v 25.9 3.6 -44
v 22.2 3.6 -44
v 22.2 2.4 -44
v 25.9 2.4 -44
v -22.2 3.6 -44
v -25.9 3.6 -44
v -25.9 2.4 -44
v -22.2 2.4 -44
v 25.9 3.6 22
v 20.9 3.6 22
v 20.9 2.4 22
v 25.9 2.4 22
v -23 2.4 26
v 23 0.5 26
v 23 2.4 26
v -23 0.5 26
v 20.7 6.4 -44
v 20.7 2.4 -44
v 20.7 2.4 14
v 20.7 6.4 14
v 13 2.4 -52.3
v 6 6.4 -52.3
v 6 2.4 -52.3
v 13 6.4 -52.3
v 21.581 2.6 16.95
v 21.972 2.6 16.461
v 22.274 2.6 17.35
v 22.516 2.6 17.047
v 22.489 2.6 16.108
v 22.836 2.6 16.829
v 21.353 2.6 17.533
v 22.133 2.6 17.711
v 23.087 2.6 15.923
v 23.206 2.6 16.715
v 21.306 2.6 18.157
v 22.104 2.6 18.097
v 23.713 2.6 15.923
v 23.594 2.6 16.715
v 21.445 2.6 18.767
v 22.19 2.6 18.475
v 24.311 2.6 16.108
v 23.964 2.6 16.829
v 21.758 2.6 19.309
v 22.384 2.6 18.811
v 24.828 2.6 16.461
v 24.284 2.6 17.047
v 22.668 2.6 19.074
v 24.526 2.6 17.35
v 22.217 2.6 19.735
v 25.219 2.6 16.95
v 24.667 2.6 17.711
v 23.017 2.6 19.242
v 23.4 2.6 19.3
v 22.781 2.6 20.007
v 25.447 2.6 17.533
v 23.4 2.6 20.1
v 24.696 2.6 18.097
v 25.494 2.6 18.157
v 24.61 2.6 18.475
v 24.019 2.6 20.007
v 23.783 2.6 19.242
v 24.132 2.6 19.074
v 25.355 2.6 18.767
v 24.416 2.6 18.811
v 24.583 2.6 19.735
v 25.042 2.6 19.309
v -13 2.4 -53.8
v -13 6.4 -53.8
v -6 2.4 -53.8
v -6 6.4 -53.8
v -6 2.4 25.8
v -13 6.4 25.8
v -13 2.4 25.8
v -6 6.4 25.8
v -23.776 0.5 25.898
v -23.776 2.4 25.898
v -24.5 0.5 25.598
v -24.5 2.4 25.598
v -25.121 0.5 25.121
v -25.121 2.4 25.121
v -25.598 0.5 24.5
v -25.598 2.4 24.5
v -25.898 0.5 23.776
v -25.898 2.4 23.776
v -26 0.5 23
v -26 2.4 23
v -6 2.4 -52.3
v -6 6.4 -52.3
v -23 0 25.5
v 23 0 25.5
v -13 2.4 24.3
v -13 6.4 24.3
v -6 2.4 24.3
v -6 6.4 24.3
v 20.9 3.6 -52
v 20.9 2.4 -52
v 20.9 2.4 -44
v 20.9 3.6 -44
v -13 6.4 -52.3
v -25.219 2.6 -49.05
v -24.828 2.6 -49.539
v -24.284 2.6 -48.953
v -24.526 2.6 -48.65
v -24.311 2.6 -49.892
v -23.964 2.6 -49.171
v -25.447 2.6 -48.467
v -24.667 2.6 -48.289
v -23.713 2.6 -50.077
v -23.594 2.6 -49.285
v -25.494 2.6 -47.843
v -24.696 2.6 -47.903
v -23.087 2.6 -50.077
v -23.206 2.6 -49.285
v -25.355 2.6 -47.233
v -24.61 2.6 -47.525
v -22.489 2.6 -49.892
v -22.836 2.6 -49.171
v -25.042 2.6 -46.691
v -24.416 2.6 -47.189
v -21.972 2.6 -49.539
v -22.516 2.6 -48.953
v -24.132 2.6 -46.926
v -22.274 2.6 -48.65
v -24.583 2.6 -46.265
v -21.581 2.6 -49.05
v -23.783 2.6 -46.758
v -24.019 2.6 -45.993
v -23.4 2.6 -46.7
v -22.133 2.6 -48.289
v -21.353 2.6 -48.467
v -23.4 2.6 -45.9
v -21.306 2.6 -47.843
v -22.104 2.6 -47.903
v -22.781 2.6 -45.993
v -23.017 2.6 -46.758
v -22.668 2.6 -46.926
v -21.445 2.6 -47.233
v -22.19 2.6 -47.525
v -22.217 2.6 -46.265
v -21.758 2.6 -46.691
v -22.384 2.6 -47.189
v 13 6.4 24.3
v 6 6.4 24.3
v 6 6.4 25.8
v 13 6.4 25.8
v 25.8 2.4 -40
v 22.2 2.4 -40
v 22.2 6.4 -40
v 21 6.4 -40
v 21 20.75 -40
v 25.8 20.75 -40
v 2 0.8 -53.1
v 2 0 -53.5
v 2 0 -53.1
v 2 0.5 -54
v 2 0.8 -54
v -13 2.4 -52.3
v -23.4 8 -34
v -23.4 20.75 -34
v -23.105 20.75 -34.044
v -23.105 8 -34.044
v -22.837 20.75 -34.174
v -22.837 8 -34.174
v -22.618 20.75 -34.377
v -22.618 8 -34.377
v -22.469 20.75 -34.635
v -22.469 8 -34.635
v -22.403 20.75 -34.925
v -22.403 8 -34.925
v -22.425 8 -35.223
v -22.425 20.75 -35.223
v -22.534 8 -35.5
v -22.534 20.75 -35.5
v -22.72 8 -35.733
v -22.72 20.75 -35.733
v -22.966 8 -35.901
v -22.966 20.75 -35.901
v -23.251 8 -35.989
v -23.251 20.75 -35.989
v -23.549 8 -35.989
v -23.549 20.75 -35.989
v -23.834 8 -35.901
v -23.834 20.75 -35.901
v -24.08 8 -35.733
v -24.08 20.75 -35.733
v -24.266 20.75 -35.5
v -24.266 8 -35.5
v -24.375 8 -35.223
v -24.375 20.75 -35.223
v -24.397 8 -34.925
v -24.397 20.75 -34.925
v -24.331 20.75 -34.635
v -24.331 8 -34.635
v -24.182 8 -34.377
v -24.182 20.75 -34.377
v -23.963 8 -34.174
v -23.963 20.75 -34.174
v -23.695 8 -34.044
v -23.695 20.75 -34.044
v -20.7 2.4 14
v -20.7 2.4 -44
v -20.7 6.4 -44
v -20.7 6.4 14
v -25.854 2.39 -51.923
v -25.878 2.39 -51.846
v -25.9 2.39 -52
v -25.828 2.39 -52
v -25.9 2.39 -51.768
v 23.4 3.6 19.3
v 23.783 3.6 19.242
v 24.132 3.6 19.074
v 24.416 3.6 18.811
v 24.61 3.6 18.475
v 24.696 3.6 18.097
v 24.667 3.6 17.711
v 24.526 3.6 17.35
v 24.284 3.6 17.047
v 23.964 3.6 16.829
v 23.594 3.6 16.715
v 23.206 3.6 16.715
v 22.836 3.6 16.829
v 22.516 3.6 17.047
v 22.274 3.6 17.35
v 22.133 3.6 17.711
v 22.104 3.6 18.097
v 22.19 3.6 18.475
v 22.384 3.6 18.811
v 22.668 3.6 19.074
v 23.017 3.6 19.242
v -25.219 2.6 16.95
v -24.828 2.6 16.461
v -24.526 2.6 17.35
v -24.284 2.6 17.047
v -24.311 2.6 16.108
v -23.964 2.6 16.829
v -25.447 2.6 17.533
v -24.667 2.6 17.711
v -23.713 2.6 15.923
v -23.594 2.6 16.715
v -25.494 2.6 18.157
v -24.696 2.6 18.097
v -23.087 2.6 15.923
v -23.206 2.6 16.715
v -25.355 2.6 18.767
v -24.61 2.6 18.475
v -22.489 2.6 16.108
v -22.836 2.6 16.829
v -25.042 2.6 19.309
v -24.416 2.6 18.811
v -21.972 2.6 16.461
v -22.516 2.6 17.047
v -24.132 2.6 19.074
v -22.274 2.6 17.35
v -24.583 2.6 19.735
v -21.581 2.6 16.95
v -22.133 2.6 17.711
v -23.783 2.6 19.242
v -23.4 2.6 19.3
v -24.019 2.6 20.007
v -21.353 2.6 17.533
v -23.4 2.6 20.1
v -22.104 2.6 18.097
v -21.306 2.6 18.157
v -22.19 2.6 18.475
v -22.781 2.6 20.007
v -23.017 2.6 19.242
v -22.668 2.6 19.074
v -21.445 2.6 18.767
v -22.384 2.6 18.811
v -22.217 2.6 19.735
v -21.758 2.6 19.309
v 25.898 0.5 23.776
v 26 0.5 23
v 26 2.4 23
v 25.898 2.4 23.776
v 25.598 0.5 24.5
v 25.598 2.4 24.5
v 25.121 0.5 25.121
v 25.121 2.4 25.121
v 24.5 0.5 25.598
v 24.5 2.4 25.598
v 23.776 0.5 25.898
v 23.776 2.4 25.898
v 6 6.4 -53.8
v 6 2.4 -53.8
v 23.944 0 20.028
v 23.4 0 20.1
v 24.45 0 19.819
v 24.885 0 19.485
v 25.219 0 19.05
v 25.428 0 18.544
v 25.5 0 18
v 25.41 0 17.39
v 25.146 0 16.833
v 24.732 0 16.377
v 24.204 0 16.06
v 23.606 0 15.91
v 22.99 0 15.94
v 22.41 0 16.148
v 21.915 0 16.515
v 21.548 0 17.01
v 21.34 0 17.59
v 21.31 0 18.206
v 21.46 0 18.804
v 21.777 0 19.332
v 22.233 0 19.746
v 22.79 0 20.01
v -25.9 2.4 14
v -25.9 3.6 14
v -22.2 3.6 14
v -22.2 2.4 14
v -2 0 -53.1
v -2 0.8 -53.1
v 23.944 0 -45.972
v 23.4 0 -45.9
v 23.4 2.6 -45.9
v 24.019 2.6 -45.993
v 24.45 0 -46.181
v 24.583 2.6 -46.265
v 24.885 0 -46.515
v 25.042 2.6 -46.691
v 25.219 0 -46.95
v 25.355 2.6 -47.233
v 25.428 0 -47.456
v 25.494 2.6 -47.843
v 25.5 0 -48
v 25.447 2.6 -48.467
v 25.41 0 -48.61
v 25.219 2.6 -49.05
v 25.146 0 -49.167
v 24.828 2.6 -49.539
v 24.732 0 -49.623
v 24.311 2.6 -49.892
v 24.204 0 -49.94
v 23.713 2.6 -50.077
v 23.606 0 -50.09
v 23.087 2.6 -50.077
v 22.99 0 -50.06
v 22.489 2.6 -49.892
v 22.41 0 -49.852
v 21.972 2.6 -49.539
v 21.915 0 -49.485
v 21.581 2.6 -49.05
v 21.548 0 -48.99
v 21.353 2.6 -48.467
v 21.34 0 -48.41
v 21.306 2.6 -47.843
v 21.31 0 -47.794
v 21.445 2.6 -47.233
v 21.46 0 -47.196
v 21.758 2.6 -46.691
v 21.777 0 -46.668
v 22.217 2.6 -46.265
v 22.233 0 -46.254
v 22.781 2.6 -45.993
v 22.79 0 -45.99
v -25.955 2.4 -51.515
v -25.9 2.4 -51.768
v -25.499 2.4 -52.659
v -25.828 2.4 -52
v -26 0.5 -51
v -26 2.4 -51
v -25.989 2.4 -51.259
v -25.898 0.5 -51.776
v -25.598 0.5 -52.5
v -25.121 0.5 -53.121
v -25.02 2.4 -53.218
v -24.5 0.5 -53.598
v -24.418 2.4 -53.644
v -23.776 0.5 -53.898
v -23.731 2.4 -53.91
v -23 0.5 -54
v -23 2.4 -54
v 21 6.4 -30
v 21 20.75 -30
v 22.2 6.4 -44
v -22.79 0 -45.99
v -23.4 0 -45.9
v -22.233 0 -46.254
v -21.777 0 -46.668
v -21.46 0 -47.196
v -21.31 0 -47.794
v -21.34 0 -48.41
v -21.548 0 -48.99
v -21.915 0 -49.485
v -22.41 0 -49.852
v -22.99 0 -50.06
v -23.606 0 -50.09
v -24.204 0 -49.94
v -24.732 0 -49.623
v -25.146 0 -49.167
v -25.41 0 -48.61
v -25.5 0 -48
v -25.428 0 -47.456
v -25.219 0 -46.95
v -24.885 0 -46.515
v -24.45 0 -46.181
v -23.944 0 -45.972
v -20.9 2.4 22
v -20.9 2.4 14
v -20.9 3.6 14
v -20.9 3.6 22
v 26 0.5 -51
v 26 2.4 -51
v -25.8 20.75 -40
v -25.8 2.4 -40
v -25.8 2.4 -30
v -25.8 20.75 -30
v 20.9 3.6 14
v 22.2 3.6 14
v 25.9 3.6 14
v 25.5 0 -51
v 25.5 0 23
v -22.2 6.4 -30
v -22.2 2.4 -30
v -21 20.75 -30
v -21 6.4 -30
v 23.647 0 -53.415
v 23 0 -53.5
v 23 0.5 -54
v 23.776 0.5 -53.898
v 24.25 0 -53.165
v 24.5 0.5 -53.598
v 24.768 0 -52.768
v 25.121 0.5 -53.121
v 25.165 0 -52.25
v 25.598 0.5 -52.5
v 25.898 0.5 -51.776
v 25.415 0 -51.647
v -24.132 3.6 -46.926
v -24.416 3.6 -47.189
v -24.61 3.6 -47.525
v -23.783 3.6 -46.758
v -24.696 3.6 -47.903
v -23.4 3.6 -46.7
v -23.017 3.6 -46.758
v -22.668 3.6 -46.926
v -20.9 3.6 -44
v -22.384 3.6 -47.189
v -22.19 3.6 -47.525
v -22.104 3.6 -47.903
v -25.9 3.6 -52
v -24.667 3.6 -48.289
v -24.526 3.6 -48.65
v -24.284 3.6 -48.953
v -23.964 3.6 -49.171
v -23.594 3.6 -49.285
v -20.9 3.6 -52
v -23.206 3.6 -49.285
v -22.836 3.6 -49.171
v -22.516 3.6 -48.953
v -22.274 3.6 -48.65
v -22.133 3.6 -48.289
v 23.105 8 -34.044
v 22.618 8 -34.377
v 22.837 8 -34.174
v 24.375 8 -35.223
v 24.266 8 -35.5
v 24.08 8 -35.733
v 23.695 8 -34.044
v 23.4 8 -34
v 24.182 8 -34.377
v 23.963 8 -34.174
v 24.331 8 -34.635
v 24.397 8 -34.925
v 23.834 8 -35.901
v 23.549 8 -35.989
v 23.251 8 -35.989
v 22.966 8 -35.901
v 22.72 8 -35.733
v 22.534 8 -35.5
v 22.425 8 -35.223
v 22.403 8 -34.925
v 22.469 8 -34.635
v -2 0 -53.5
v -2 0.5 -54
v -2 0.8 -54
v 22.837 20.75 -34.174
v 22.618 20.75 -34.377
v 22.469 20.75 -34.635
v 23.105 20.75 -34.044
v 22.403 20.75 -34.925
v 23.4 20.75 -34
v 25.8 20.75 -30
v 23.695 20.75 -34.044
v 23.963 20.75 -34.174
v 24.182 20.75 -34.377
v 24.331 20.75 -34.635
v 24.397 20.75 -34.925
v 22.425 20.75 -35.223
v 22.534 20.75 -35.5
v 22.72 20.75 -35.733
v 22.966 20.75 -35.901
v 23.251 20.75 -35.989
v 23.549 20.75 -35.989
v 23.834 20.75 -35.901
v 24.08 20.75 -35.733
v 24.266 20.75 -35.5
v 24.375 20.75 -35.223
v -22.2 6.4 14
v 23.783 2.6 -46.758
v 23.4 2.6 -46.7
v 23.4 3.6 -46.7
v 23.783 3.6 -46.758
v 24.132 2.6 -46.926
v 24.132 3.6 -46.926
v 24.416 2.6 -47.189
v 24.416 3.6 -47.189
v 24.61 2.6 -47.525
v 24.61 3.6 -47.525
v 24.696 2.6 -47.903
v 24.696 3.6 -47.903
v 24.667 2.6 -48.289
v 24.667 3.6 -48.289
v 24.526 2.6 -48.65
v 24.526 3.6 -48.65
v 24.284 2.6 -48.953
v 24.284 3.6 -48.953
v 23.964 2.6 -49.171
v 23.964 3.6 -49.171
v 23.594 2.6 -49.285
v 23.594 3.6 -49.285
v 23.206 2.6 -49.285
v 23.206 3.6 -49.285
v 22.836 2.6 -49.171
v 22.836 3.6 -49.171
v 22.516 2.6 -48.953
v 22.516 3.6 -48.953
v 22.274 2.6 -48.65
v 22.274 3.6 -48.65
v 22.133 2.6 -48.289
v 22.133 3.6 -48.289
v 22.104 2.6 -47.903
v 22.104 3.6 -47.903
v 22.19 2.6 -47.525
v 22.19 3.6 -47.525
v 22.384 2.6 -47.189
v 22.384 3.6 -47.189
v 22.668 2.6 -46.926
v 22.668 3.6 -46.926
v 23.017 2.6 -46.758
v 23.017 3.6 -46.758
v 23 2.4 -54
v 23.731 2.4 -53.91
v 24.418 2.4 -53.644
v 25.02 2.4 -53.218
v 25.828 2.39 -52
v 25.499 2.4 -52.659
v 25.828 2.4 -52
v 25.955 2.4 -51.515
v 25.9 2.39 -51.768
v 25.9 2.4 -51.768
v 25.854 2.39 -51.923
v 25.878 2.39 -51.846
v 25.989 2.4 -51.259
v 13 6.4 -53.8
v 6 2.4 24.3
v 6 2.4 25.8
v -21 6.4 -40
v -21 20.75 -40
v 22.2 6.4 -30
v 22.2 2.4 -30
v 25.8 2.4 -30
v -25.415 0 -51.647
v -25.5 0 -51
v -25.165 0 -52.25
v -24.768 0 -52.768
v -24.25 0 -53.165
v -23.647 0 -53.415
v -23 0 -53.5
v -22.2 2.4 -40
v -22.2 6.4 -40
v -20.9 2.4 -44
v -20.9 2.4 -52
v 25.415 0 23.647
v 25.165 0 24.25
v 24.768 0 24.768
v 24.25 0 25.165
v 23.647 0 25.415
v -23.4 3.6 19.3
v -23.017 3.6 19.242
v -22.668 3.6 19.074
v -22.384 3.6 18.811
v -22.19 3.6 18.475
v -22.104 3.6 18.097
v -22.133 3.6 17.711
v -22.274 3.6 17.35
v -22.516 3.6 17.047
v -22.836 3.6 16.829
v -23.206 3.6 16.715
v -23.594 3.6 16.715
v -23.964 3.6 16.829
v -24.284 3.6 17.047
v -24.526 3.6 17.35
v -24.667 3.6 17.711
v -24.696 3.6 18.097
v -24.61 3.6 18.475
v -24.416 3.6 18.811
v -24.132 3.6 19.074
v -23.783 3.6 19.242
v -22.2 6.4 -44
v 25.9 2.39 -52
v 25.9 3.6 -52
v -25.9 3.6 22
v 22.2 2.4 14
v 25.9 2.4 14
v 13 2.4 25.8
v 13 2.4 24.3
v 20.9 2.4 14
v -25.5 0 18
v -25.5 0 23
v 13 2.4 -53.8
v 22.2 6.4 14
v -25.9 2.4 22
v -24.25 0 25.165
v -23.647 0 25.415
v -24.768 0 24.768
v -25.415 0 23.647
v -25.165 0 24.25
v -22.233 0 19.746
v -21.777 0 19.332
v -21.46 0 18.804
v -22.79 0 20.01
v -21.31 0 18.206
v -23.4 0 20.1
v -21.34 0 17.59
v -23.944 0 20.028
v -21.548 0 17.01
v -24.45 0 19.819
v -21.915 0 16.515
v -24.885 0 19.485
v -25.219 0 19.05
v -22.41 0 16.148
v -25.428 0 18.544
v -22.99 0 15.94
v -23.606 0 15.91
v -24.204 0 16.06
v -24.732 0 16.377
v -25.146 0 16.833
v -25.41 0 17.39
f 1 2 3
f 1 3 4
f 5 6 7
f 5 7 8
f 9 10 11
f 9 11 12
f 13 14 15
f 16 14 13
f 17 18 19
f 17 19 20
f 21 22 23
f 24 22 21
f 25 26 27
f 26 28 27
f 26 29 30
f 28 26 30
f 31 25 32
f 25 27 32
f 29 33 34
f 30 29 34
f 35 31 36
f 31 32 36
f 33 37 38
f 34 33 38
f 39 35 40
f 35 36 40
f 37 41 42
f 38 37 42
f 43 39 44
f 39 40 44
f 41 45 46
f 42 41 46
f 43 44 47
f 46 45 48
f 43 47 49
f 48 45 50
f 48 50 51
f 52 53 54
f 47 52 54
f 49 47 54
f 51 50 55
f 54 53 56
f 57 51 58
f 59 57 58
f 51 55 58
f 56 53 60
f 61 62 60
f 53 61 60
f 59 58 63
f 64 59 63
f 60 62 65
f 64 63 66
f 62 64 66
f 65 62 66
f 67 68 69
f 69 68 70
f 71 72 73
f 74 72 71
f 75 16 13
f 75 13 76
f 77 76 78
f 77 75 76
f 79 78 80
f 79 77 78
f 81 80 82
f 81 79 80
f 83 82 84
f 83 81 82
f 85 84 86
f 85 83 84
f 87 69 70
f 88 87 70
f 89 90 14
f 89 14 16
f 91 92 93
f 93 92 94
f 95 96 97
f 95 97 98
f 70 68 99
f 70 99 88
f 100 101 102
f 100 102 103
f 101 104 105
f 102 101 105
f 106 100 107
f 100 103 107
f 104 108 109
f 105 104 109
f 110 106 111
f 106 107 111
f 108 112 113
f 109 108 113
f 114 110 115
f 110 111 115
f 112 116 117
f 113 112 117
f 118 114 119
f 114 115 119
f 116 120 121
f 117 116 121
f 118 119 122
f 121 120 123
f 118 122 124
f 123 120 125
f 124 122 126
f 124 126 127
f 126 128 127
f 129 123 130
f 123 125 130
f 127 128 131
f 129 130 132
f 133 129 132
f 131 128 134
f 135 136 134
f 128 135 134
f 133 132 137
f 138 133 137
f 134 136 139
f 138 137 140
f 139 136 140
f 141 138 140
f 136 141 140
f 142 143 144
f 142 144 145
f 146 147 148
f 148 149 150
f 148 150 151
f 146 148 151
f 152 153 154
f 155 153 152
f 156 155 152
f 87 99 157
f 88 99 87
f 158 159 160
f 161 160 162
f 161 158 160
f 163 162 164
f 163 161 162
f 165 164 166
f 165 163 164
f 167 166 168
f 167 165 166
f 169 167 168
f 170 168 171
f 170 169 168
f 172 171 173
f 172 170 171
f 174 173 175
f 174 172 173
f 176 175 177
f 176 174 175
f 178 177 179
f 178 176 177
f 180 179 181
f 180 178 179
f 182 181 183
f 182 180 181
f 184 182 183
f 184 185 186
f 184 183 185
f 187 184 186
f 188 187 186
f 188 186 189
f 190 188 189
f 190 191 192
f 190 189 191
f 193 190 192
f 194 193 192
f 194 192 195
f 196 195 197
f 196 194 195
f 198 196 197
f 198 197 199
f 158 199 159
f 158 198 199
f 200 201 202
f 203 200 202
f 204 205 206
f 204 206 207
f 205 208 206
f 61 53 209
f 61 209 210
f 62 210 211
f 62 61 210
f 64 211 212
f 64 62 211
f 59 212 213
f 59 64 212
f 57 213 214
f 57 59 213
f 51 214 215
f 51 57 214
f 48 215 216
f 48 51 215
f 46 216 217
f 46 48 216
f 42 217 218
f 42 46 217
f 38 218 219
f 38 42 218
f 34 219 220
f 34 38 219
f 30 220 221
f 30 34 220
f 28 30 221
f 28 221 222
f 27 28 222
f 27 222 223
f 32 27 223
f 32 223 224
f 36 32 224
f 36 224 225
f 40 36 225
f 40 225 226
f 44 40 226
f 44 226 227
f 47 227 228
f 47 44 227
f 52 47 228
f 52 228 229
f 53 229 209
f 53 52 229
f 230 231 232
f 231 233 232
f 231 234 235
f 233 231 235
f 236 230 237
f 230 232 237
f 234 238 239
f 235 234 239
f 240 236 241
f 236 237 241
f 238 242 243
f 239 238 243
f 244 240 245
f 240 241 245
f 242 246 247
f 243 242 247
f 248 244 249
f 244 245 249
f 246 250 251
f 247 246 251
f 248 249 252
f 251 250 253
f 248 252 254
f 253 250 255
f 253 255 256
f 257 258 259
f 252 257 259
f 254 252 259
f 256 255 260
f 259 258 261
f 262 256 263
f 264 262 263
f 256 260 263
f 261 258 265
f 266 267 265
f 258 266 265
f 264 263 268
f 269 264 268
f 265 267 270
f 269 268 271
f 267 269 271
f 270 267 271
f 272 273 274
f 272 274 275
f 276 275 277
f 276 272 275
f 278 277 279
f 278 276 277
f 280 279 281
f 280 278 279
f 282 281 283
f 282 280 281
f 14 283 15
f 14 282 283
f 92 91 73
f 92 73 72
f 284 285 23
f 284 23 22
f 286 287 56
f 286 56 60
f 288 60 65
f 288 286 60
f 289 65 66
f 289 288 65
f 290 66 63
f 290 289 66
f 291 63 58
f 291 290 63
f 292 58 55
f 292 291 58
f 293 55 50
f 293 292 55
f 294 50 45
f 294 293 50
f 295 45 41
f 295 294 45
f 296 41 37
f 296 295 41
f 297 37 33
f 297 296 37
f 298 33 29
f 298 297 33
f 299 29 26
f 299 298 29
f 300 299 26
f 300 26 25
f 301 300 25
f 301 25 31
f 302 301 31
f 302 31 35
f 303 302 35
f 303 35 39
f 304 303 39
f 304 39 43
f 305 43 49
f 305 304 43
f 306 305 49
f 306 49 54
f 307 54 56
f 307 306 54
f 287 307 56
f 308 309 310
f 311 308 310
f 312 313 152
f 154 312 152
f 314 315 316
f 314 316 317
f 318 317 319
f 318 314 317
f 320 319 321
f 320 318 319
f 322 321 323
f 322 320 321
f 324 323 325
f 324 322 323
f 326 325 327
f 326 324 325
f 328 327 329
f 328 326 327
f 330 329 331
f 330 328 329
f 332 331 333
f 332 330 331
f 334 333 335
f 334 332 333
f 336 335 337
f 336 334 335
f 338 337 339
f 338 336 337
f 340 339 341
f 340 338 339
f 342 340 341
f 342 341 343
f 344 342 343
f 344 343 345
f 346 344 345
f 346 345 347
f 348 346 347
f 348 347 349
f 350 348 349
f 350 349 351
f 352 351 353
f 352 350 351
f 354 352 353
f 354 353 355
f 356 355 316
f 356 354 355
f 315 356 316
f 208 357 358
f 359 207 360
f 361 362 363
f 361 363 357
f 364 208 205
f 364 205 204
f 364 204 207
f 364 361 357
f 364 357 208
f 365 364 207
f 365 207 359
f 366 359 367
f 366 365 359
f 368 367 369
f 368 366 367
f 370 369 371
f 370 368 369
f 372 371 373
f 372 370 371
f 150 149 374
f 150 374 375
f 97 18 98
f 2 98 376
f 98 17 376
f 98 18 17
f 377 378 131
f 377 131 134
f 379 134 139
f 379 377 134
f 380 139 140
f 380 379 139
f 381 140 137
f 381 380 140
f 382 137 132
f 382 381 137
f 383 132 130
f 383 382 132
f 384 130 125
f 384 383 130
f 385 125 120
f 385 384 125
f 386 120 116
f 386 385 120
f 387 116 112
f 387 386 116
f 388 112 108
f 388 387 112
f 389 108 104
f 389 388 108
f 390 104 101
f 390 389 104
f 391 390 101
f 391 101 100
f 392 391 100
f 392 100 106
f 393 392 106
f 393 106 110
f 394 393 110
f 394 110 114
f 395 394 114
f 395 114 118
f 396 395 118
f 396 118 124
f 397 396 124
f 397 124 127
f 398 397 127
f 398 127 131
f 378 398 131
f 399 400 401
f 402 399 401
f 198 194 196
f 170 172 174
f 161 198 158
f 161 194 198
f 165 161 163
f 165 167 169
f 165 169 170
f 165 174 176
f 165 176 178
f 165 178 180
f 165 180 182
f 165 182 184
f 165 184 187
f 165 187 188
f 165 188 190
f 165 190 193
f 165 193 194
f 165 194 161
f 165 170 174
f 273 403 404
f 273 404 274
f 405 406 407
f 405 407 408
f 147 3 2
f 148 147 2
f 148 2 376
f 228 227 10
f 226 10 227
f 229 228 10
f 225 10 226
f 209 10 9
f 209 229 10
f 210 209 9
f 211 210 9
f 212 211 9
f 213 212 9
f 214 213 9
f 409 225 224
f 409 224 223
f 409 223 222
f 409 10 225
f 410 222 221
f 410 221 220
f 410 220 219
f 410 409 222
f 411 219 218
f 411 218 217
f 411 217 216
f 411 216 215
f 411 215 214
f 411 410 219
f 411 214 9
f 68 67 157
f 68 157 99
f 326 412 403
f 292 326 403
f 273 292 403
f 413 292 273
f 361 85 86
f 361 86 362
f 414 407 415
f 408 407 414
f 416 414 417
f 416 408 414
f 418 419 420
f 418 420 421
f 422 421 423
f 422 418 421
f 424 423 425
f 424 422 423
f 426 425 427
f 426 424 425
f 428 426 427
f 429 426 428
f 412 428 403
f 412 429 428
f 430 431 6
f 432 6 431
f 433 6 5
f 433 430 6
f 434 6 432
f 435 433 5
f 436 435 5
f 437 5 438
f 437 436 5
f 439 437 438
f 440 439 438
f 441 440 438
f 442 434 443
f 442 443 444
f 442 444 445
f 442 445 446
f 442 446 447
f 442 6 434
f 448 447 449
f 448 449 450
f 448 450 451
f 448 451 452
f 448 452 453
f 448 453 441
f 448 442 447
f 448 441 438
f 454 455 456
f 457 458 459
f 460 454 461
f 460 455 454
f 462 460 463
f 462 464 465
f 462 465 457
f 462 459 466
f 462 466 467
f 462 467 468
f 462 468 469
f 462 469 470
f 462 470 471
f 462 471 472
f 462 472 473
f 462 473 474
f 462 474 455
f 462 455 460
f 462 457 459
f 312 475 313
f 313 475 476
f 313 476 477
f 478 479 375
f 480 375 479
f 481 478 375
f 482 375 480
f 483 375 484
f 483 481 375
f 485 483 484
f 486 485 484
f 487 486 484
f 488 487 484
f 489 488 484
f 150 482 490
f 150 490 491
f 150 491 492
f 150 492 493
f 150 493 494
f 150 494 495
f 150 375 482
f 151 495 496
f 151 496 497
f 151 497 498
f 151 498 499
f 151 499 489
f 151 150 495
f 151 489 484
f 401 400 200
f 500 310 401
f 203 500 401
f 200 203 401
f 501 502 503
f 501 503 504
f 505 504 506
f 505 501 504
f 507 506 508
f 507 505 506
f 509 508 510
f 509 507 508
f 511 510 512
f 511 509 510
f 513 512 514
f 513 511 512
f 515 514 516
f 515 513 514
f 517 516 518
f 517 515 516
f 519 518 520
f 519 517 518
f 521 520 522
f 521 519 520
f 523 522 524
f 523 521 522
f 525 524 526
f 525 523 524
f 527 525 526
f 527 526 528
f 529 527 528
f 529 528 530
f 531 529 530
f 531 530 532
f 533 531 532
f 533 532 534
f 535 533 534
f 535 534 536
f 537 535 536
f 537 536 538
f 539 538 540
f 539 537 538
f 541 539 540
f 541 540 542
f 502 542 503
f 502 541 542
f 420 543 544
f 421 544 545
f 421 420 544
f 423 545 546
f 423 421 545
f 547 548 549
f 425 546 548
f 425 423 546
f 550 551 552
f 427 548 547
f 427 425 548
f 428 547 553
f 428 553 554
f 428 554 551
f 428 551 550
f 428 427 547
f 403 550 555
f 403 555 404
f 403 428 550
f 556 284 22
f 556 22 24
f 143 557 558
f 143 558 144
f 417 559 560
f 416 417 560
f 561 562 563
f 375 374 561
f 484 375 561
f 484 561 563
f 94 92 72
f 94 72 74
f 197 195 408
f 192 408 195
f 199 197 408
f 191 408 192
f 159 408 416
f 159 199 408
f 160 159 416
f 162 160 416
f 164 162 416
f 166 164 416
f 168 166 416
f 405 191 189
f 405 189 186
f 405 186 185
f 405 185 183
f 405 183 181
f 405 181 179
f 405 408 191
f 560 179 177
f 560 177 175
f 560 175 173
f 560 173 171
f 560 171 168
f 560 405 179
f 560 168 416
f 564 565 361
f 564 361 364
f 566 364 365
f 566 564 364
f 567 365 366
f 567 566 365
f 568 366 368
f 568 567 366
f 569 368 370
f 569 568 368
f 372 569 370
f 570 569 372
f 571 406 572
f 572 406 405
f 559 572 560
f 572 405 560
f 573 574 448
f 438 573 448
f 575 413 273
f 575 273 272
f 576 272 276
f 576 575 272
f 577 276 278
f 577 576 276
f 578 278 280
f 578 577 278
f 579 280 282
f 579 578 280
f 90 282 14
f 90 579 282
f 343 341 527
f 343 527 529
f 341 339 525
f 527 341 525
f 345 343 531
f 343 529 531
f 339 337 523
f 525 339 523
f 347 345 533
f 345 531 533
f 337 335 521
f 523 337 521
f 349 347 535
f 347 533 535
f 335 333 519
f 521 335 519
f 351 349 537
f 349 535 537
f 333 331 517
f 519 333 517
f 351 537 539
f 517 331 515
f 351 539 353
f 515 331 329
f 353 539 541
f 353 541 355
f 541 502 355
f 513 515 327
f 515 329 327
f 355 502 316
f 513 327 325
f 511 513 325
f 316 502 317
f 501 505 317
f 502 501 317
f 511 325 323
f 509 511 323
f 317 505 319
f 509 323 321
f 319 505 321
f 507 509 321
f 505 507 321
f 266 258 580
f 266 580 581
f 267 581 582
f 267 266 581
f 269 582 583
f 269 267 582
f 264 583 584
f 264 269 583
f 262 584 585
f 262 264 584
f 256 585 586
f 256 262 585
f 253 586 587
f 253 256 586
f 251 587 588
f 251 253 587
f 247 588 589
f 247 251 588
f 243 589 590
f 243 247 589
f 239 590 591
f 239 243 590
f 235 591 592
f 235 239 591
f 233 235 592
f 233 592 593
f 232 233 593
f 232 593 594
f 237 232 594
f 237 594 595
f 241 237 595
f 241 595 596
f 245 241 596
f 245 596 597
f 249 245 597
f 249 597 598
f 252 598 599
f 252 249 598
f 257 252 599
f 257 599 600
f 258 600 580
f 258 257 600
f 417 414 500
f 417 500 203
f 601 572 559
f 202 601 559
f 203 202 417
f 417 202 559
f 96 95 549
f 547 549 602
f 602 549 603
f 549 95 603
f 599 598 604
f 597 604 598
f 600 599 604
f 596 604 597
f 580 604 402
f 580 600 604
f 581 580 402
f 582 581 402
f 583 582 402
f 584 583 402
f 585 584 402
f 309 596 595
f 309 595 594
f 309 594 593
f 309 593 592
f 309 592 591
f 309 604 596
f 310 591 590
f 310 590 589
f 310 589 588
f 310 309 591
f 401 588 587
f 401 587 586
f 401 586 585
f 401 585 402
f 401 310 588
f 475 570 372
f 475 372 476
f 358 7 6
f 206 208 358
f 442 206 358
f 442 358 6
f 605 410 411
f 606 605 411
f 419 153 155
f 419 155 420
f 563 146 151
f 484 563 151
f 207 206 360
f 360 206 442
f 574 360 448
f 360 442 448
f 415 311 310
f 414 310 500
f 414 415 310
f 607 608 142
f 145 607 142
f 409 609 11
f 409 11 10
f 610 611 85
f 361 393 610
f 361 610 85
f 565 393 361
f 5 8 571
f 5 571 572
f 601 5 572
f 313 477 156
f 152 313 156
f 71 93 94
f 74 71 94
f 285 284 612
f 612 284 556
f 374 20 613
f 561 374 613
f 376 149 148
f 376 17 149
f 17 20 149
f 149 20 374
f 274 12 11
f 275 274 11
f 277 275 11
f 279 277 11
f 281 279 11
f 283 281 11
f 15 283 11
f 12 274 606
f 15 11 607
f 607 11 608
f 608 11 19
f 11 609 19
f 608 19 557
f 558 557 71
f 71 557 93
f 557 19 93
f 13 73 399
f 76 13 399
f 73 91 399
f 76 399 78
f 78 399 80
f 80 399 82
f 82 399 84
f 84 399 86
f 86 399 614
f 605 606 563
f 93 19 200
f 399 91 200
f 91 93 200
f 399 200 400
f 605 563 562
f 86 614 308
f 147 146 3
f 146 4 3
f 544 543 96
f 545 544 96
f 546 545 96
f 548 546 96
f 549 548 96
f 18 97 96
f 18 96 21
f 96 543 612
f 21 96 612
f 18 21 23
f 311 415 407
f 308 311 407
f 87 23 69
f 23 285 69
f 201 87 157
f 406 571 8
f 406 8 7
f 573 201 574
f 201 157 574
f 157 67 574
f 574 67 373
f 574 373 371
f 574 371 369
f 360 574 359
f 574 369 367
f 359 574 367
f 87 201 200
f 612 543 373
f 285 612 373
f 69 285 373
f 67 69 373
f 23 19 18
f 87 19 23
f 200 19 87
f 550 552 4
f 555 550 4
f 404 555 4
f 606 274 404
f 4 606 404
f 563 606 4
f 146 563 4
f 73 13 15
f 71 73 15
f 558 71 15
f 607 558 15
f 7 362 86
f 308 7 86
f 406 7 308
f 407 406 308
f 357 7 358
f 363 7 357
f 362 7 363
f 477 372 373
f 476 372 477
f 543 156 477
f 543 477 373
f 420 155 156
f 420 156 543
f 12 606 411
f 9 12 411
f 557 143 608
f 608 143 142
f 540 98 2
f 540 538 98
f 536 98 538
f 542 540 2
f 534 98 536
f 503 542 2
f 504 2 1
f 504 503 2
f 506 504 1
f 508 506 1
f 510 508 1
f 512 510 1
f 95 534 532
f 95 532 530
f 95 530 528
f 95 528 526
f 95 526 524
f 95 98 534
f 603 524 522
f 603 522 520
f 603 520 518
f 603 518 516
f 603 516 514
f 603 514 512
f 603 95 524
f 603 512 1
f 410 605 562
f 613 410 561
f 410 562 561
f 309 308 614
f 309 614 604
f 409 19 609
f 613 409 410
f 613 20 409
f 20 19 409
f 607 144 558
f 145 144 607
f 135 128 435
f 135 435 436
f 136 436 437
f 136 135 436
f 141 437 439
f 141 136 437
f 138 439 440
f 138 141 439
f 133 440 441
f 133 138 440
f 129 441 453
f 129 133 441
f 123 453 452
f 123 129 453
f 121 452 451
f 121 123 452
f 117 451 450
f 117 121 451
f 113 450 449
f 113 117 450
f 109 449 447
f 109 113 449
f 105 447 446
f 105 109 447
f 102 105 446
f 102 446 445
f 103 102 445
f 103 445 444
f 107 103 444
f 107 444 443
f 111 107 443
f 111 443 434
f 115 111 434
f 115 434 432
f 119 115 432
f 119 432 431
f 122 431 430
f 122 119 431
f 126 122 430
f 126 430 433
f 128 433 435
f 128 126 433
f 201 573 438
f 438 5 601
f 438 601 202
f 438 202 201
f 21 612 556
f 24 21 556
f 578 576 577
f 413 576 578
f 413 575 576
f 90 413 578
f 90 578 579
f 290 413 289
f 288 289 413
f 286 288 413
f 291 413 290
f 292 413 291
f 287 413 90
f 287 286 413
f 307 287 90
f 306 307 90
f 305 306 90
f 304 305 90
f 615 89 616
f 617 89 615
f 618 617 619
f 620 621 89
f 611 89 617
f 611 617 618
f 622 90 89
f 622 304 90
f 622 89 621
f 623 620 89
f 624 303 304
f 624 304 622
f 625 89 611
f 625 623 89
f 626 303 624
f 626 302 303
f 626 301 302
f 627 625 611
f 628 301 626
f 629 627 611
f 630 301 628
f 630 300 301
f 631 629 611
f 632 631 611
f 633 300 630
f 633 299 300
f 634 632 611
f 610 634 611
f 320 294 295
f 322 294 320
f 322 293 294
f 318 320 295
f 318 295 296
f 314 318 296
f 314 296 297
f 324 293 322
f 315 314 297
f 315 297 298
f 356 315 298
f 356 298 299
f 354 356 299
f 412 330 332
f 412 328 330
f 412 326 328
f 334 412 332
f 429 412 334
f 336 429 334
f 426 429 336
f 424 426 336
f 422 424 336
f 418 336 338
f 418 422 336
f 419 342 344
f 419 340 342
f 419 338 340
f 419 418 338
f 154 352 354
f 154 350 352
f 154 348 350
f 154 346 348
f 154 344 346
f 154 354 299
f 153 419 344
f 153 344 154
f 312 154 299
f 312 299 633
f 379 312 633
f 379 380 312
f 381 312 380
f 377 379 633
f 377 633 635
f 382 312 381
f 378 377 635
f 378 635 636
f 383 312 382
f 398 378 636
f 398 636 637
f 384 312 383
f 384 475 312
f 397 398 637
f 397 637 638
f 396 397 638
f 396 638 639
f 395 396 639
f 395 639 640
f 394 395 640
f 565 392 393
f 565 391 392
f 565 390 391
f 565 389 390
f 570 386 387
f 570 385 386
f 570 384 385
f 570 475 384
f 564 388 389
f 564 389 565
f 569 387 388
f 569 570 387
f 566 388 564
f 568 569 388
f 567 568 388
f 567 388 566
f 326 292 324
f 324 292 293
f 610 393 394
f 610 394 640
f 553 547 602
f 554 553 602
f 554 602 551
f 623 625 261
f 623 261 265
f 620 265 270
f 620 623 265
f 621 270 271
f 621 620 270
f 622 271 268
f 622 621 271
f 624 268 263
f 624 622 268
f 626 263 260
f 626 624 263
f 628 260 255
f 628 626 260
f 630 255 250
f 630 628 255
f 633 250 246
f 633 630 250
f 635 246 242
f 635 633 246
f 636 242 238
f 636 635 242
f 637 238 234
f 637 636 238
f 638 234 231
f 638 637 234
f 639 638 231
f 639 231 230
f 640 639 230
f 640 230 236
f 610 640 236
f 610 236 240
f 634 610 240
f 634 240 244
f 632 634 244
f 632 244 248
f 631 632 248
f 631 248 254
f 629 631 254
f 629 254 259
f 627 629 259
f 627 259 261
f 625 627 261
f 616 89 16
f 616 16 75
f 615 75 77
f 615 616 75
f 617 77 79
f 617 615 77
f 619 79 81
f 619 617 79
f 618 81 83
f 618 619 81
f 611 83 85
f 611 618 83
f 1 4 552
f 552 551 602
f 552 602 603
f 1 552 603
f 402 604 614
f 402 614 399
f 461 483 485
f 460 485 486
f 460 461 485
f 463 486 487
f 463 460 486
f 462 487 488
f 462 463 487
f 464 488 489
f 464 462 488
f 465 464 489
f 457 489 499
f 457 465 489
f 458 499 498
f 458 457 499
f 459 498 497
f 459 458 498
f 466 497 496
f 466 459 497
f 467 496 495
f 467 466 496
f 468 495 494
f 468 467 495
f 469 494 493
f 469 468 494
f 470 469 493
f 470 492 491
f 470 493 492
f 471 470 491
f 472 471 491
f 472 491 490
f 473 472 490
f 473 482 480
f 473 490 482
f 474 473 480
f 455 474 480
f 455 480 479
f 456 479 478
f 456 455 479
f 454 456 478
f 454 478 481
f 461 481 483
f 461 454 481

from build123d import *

# Parameters (mm, degrees)
BOSS_EXTRUDE1_DEPTH  = 2.4
CHAMFER1_SIZE        = 0.5
BOSS_EXTRUDE2_START  = -52
SKETCH2_W            = 5
SKETCH2_H            = 1.21
BOSS_EXTRUDE2_DEPTH  = 8
BOSS_EXTRUDE3_START  = 14
SKETCH3_W            = 5
SKETCH3_H            = 1.21
BOSS_EXTRUDE3_DEPTH  = 8
BOSS_EXTRUDE4_START  = -52
SKETCH4_W            = 5
SKETCH4_H            = 1.21
BOSS_EXTRUDE4_DEPTH  = 8
BOSS_EXTRUDE5_START  = 14
SKETCH5_W            = 5
SKETCH5_H            = 1.21
BOSS_EXTRUDE5_DEPTH  = 8
BOSS_EXTRUDE6_START  = -44
SKETCH6_W            = 1.5
SKETCH6_H            = 4.01
BOSS_EXTRUDE6_DEPTH  = 58
BOSS_EXTRUDE7_START  = -40
SKETCH7_W            = 4.8
SKETCH7_H            = 18.36
BOSS_EXTRUDE7_DEPTH  = 10
BOSS_EXTRUDE8_START  = 8
SKETCH8_R            = 1
BOSS_EXTRUDE8_DEPTH  = 13.75
BOSS_EXTRUDE9_START  = -53.8
SKETCH9_W            = 7
SKETCH9_H            = 4.01
BOSS_EXTRUDE9_DEPTH  = 1.5
BOSS_EXTRUDE10_START = 24.3
SKETCH10_W           = 7
SKETCH10_H           = 4.01
BOSS_EXTRUDE10_DEPTH = 1.5
BOSS_EXTRUDE11_START = -44
SKETCH11_W           = 1.5
SKETCH11_H           = 4.01
BOSS_EXTRUDE11_DEPTH = 58
BOSS_EXTRUDE12_START = -40
SKETCH12_W           = 4.8
SKETCH12_H           = 18.36
BOSS_EXTRUDE12_DEPTH = 10
BOSS_EXTRUDE13_START = 8
SKETCH13_R           = 1
BOSS_EXTRUDE13_DEPTH = 13.75
BOSS_EXTRUDE14_START = -53.8
SKETCH14_W           = 7
SKETCH14_H           = 4.01
BOSS_EXTRUDE14_DEPTH = 1.5
BOSS_EXTRUDE15_START = 24.3
SKETCH15_W           = 7
SKETCH15_H           = 4.01
BOSS_EXTRUDE15_DEPTH = 1.5
BOSS_EXTRUDE16_START = -1
SKETCH16_R           = 2.1
BOSS_EXTRUDE16_DEPTH = 3.6
BOSS_EXTRUDE17_START = 2.5
SKETCH17_R           = 1.3
BOSS_EXTRUDE17_DEPTH = 1.2
BOSS_EXTRUDE18_START = -1
SKETCH18_R           = 2.1
BOSS_EXTRUDE18_DEPTH = 3.6
BOSS_EXTRUDE19_START = 2.5
SKETCH19_R           = 1.3
BOSS_EXTRUDE19_DEPTH = 1.2
BOSS_EXTRUDE20_START = -1
SKETCH20_R           = 2.1
BOSS_EXTRUDE20_DEPTH = 3.6
BOSS_EXTRUDE21_START = 2.5
SKETCH21_R           = 1.3
BOSS_EXTRUDE21_DEPTH = 1.2
BOSS_EXTRUDE22_START = -1
SKETCH22_R           = 2.1
BOSS_EXTRUDE22_DEPTH = 3.6
BOSS_EXTRUDE23_START = 2.5
SKETCH23_R           = 1.3
BOSS_EXTRUDE23_DEPTH = 1.2
BOSS_EXTRUDE24_START = -54.1
SKETCH24_W           = 4
SKETCH24_H           = 0.9
BOSS_EXTRUDE24_DEPTH = 1


with BuildPart() as part:
    # Sketch1 → Boss-Extrude1 (new body)
    with BuildSketch(Plane(origin=(0, 0, 0), x_dir=(1, 0, 0), z_dir=(0, 1, 0))):
        with BuildLine():
            Line((-23, 54), (23, 54))
            ThreePointArc((23, 54), (25.121320344, 53.121320344), (26, 51))
            Line((26, 51), (26, -23))
            ThreePointArc((26, -23), (25.121320344, -25.121320344), (23, -26))
            Line((23, -26), (-23, -26))
            ThreePointArc((-23, -26), (-25.121320344, -25.121320344), (-26, -23))
            Line((-26, -23), (-26, 51))
            ThreePointArc((-26, 51), (-25.121320344, 53.121320344), (-23, 54))
        make_face()
    extrude(amount=BOSS_EXTRUDE1_DEPTH)

    # Chamfer1
    chamfer1_edges = [part.edges().sort_by_distance(p)[0] for p in [
        (0, 0, 26),
        (-25.121320344, 0, 25.121320344),
        (-26, 0, -14),
        (-25.121320344, 0, -53.121320344),
        (0, 0, -54),
        (25.121320344, 0, -53.121320344),
        (26, 0, -14),
        (25.121320344, 0, 25.121320344),
    ]]
    chamfer(chamfer1_edges, length=CHAMFER1_SIZE)

    # Sketch2 → Boss-Extrude2 (add)
    with BuildSketch(Plane.XY.offset(BOSS_EXTRUDE2_START)):
        with Locations((-23.4, 2.995)):
            Rectangle(SKETCH2_W, SKETCH2_H)
    extrude(amount=BOSS_EXTRUDE2_DEPTH)

    # Sketch3 → Boss-Extrude3 (add)
    with BuildSketch(Plane.XY.offset(BOSS_EXTRUDE3_START)):
        with Locations((-23.4, 2.995)):
            Rectangle(SKETCH3_W, SKETCH3_H)
    extrude(amount=BOSS_EXTRUDE3_DEPTH)

    # Sketch4 → Boss-Extrude4 (add)
    with BuildSketch(Plane.XY.offset(BOSS_EXTRUDE4_START)):
        with Locations((23.4, 2.995)):
            Rectangle(SKETCH4_W, SKETCH4_H)
    extrude(amount=BOSS_EXTRUDE4_DEPTH)

    # Sketch5 → Boss-Extrude5 (add)
    with BuildSketch(Plane.XY.offset(BOSS_EXTRUDE5_START)):
        with Locations((23.4, 2.995)):
            Rectangle(SKETCH5_W, SKETCH5_H)
    extrude(amount=BOSS_EXTRUDE5_DEPTH)

    # Sketch6 → Boss-Extrude6 (add)
    with BuildSketch(Plane.XY.offset(BOSS_EXTRUDE6_START)):
        with Locations((-21.45, 4.395)):
            Rectangle(SKETCH6_W, SKETCH6_H)
    extrude(amount=BOSS_EXTRUDE6_DEPTH)

    # Sketch7 → Boss-Extrude7 (add)
    with BuildSketch(Plane.XY.offset(BOSS_EXTRUDE7_START)):
        with Locations((-23.4, 11.57)):
            Rectangle(SKETCH7_W, SKETCH7_H)
    extrude(amount=BOSS_EXTRUDE7_DEPTH)


with BuildPart() as body_2:
    # Sketch8 → Boss-Extrude8 (new body)
    with BuildSketch(Plane(origin=(0, 0, 0), x_dir=(1, 0, 0), z_dir=(0, 1, 0)).offset(BOSS_EXTRUDE8_START)):
        with Locations(Location((-23.4, 35, 0), (0, 0, 270))):
            Circle(SKETCH8_R)
    extrude(amount=BOSS_EXTRUDE8_DEPTH)


with BuildPart() as part_1:
    add(part.part)

    # Combine1: cut body 2
    add(body_2.part, mode=Mode.SUBTRACT)

    # Sketch9 → Boss-Extrude9 (add)
    with BuildSketch(Plane.XY.offset(BOSS_EXTRUDE9_START)):
        with Locations((-9.5, 4.395)):
            Rectangle(SKETCH9_W, SKETCH9_H)
    extrude(amount=BOSS_EXTRUDE9_DEPTH)

    # Sketch10 → Boss-Extrude10 (add)
    with BuildSketch(Plane.XY.offset(BOSS_EXTRUDE10_START)):
        with Locations((-9.5, 4.395)):
            Rectangle(SKETCH10_W, SKETCH10_H)
    extrude(amount=BOSS_EXTRUDE10_DEPTH)

    # Sketch11 → Boss-Extrude11 (add)
    with BuildSketch(Plane.XY.offset(BOSS_EXTRUDE11_START)):
        with Locations((21.45, 4.395)):
            Rectangle(SKETCH11_W, SKETCH11_H)
    extrude(amount=BOSS_EXTRUDE11_DEPTH)

    # Sketch12 → Boss-Extrude12 (add)
    with BuildSketch(Plane.XY.offset(BOSS_EXTRUDE12_START)):
        with Locations((23.4, 11.57)):
            Rectangle(SKETCH12_W, SKETCH12_H)
    extrude(amount=BOSS_EXTRUDE12_DEPTH)


with BuildPart() as body_2_2:
    # Sketch13 → Boss-Extrude13 (new body)
    with BuildSketch(Plane(origin=(0, 0, 0), x_dir=(1, 0, 0), z_dir=(0, 1, 0)).offset(BOSS_EXTRUDE13_START)):
        with Locations(Location((23.4, 35, 0), (0, 0, 270))):
            Circle(SKETCH13_R)
    extrude(amount=BOSS_EXTRUDE13_DEPTH)


with BuildPart() as part_2:
    add(part_1.part)

    # Combine2: cut body 2 2
    add(body_2_2.part, mode=Mode.SUBTRACT)

    # Sketch14 → Boss-Extrude14 (add)
    with BuildSketch(Plane.XY.offset(BOSS_EXTRUDE14_START)):
        with Locations((9.5, 4.395)):
            Rectangle(SKETCH14_W, SKETCH14_H)
    extrude(amount=BOSS_EXTRUDE14_DEPTH)

    # Sketch15 → Boss-Extrude15 (add)
    with BuildSketch(Plane.XY.offset(BOSS_EXTRUDE15_START)):
        with Locations((9.5, 4.395)):
            Rectangle(SKETCH15_W, SKETCH15_H)
    extrude(amount=BOSS_EXTRUDE15_DEPTH)


with BuildPart() as body_2_3:
    # Sketch16 → Boss-Extrude16 (new body)
    with BuildSketch(Plane(origin=(0, 0, 0), x_dir=(1, 0, 0), z_dir=(0, 1, 0)).offset(BOSS_EXTRUDE16_START)):
        with Locations(Location((-23.4, 48, 0), (0, 0, 270))):
            Circle(SKETCH16_R)
    extrude(amount=BOSS_EXTRUDE16_DEPTH)


with BuildPart() as part_3:
    add(part_2.part)

    # Combine3: cut body 2 3
    add(body_2_3.part, mode=Mode.SUBTRACT)


with BuildPart() as body_2_4:
    # Sketch17 → Boss-Extrude17 (new body)
    with BuildSketch(Plane(origin=(0, 0, 0), x_dir=(1, 0, 0), z_dir=(0, 1, 0)).offset(BOSS_EXTRUDE17_START)):
        with Locations(Location((-23.4, 48, 0), (0, 0, 270))):
            Circle(SKETCH17_R)
    extrude(amount=BOSS_EXTRUDE17_DEPTH)


with BuildPart() as part_4:
    add(part_3.part)

    # Combine4: cut body 2 4
    add(body_2_4.part, mode=Mode.SUBTRACT)


with BuildPart() as body_2_5:
    # Sketch18 → Boss-Extrude18 (new body)
    with BuildSketch(Plane(origin=(0, 0, 0), x_dir=(1, 0, 0), z_dir=(0, 1, 0)).offset(BOSS_EXTRUDE18_START)):
        with Locations(Location((-23.4, -18, 0), (0, 0, 270))):
            Circle(SKETCH18_R)
    extrude(amount=BOSS_EXTRUDE18_DEPTH)


with BuildPart() as part_5:
    add(part_4.part)

    # Combine5: cut body 2 5
    add(body_2_5.part, mode=Mode.SUBTRACT)


with BuildPart() as body_2_6:
    # Sketch19 → Boss-Extrude19 (new body)
    with BuildSketch(Plane(origin=(0, 0, 0), x_dir=(1, 0, 0), z_dir=(0, 1, 0)).offset(BOSS_EXTRUDE19_START)):
        with Locations(Location((-23.4, -18, 0), (0, 0, 270))):
            Circle(SKETCH19_R)
    extrude(amount=BOSS_EXTRUDE19_DEPTH)


with BuildPart() as part_6:
    add(part_5.part)

    # Combine6: cut body 2 6
    add(body_2_6.part, mode=Mode.SUBTRACT)


with BuildPart() as body_2_7:
    # Sketch20 → Boss-Extrude20 (new body)
    with BuildSketch(Plane(origin=(0, 0, 0), x_dir=(1, 0, 0), z_dir=(0, 1, 0)).offset(BOSS_EXTRUDE20_START)):
        with Locations(Location((23.4, 48, 0), (0, 0, 270))):
            Circle(SKETCH20_R)
    extrude(amount=BOSS_EXTRUDE20_DEPTH)


with BuildPart() as part_7:
    add(part_6.part)

    # Combine7: cut body 2 7
    add(body_2_7.part, mode=Mode.SUBTRACT)


with BuildPart() as body_2_8:
    # Sketch21 → Boss-Extrude21 (new body)
    with BuildSketch(Plane(origin=(0, 0, 0), x_dir=(1, 0, 0), z_dir=(0, 1, 0)).offset(BOSS_EXTRUDE21_START)):
        with Locations(Location((23.4, 48, 0), (0, 0, 270))):
            Circle(SKETCH21_R)
    extrude(amount=BOSS_EXTRUDE21_DEPTH)


with BuildPart() as part_8:
    add(part_7.part)

    # Combine8: cut body 2 8
    add(body_2_8.part, mode=Mode.SUBTRACT)


with BuildPart() as body_2_9:
    # Sketch22 → Boss-Extrude22 (new body)
    with BuildSketch(Plane(origin=(0, 0, 0), x_dir=(1, 0, 0), z_dir=(0, 1, 0)).offset(BOSS_EXTRUDE22_START)):
        with Locations(Location((23.4, -18, 0), (0, 0, 270))):
            Circle(SKETCH22_R)
    extrude(amount=BOSS_EXTRUDE22_DEPTH)


with BuildPart() as part_9:
    add(part_8.part)

    # Combine9: cut body 2 9
    add(body_2_9.part, mode=Mode.SUBTRACT)


with BuildPart() as body_2_10:
    # Sketch23 → Boss-Extrude23 (new body)
    with BuildSketch(Plane(origin=(0, 0, 0), x_dir=(1, 0, 0), z_dir=(0, 1, 0)).offset(BOSS_EXTRUDE23_START)):
        with Locations(Location((23.4, -18, 0), (0, 0, 270))):
            Circle(SKETCH23_R)
    extrude(amount=BOSS_EXTRUDE23_DEPTH)


with BuildPart() as part_10:
    add(part_9.part)

    # Combine10: cut body 2 10
    add(body_2_10.part, mode=Mode.SUBTRACT)


with BuildPart() as body_2_11:
    # Sketch24 → Boss-Extrude24 (new body)
    with BuildSketch(Plane.XY.offset(BOSS_EXTRUDE24_START)):
        with Locations((0, 0.35)):
            Rectangle(SKETCH24_W, SKETCH24_H)
    extrude(amount=BOSS_EXTRUDE24_DEPTH)


with BuildPart() as part_11:
    add(part_10.part)

    # Combine11: cut body 2 11
    add(body_2_11.part, mode=Mode.SUBTRACT)


solid = part_11.part
